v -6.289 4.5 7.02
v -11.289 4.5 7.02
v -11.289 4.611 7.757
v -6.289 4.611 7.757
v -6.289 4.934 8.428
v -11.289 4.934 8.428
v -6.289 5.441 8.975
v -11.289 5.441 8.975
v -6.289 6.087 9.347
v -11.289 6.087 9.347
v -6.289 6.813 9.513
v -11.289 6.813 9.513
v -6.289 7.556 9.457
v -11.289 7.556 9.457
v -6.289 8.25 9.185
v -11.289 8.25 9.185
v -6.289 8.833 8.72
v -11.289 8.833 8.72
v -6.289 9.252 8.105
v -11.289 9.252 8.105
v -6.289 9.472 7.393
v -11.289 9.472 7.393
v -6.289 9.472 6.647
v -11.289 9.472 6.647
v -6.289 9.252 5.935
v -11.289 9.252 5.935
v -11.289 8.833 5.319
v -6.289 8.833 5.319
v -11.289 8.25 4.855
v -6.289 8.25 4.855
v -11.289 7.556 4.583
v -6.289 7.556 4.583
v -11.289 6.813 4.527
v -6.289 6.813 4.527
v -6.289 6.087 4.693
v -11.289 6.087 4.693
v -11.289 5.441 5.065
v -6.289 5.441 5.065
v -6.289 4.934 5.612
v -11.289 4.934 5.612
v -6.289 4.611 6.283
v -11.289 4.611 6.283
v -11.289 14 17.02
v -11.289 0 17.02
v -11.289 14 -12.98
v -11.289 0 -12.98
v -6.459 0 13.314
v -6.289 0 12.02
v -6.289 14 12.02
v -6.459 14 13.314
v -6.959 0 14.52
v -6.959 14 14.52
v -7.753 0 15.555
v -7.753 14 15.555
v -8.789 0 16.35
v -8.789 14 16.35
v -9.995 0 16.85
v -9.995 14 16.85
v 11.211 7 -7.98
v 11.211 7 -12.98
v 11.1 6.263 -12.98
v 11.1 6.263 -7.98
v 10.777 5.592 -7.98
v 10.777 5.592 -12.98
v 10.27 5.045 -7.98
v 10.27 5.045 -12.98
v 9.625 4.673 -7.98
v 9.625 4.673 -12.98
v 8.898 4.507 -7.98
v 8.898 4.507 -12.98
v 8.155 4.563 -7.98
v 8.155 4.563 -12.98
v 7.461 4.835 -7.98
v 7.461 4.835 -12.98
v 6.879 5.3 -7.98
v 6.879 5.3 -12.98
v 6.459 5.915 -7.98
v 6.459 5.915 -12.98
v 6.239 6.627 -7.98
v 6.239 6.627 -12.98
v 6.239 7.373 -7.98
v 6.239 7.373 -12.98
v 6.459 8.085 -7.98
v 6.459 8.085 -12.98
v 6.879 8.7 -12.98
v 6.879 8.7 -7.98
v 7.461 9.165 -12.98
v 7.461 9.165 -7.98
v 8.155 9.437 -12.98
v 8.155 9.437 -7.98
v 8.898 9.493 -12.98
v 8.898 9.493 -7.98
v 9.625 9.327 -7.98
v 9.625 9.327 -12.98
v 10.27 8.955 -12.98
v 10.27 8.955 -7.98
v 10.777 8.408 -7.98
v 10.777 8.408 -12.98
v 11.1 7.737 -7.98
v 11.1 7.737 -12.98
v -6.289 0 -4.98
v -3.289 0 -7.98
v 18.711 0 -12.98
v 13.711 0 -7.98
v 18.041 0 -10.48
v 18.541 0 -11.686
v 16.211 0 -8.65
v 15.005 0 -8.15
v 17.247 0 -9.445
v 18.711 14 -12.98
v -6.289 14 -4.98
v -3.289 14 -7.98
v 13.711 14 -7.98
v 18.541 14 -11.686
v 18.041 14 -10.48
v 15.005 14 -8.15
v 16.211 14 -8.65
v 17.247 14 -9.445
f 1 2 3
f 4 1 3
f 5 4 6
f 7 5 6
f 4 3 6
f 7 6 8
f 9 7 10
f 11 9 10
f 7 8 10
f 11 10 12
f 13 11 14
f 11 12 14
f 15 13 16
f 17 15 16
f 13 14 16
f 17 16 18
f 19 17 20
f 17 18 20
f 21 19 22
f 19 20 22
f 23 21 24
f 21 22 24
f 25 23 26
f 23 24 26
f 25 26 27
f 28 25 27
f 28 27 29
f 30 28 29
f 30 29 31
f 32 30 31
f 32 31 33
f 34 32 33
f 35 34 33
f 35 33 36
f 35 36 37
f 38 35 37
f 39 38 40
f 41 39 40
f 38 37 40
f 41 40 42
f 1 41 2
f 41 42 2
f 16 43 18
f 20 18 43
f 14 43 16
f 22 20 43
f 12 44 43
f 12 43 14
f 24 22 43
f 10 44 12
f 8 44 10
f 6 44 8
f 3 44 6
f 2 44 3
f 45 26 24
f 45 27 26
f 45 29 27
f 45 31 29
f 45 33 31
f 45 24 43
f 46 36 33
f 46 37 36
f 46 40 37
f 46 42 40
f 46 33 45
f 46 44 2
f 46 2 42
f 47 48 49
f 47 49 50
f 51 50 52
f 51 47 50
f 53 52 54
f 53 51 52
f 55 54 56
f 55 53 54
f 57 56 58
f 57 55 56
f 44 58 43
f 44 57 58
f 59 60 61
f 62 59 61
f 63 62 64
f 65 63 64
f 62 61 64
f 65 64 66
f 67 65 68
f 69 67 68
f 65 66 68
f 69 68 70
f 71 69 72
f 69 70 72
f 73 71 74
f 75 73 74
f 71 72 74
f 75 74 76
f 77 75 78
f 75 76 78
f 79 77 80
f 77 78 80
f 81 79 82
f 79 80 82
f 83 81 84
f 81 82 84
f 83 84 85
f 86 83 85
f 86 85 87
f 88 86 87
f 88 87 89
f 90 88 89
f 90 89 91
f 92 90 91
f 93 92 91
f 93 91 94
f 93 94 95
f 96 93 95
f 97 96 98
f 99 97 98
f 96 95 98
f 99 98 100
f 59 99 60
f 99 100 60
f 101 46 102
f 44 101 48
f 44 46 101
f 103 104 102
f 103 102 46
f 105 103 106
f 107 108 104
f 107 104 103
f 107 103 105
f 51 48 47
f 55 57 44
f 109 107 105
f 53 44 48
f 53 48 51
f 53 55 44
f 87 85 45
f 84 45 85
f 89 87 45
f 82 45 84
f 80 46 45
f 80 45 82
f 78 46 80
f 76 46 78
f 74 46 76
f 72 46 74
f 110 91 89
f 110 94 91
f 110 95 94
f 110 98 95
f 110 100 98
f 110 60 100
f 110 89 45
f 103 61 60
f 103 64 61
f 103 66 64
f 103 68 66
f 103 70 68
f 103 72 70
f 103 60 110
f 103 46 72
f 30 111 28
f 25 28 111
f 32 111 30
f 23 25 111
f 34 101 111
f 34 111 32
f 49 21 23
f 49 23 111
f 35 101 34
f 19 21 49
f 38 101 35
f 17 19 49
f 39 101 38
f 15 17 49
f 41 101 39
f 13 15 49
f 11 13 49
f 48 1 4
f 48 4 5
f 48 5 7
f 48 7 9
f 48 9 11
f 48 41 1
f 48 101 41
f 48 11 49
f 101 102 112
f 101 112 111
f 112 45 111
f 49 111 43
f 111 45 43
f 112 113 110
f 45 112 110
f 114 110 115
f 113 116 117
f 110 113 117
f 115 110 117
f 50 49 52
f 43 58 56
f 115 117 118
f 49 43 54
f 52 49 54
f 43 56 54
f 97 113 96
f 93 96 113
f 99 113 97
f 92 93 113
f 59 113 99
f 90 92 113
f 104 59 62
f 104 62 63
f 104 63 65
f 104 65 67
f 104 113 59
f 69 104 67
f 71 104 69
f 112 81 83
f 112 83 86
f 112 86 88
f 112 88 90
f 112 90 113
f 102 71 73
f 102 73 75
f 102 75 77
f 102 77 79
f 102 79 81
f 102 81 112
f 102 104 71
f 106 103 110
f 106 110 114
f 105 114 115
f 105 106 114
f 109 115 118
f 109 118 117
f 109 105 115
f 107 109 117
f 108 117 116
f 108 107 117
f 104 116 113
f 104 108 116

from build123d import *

# Parameters (mm, degrees)
F1_DEPTH = 14
F2_R     = 2.5
F3_DEPTH = 5
F4_R     = 2.5
F5_DEPTH = 5


with BuildPart() as f1:
    # F0 (on Front) → F1 (new body)
    with BuildSketch(Plane.XZ):
        Polygon((-6.288725, 7.019924), (-11.288725, 7.019924), (-11.288725, -12.980076), (8.711275, -12.980076), (8.711275, -7.980076), (-3.288725, -7.980076), (-6.288725, -4.980076), align=None)
        with BuildLine():
            Line((8.711275, -7.980076), (8.711275, -12.980076))
            Line((8.711275, -12.980076), (18.711275, -12.980076))
            ThreePointArc((18.711275, -12.980076), (17.246809, -9.444542), (13.711275, -7.980076))
            Line((13.711275, -7.980076), (8.711275, -7.980076))
        make_face()
        with BuildLine():
            ThreePointArc((-6.288725, 12.019924), (-7.753191, 15.555458), (-11.288725, 17.019924))
            Line((-11.288725, 17.019924), (-11.288725, 7.019924))
            Line((-11.288725, 7.019924), (-6.288725, 7.019924))
            Line((-6.288725, 7.019924), (-6.288725, 12.019924))
        make_face()
    extrude(amount=-F1_DEPTH)

    # F2 (on face) → F3 (cut)
    with BuildSketch(Plane(origin=(-11.288725, 0, 0), x_dir=(0, -1, 0), z_dir=(-1, 0, 0))):
        with Locations((-7, 7.019924)):
            Circle(F2_R)
    extrude(amount=-F3_DEPTH, mode=Mode.SUBTRACT)

    # F4 (on face) → F5 (cut)
    with BuildSketch(Plane(origin=(0, 0, -12.980076), x_dir=(1, 0, 0), z_dir=(0, 0, -1))):
        with Locations((8.711275, -7)):
            Circle(F4_R)
    extrude(amount=-F5_DEPTH, mode=Mode.SUBTRACT)


solid = f1.part
